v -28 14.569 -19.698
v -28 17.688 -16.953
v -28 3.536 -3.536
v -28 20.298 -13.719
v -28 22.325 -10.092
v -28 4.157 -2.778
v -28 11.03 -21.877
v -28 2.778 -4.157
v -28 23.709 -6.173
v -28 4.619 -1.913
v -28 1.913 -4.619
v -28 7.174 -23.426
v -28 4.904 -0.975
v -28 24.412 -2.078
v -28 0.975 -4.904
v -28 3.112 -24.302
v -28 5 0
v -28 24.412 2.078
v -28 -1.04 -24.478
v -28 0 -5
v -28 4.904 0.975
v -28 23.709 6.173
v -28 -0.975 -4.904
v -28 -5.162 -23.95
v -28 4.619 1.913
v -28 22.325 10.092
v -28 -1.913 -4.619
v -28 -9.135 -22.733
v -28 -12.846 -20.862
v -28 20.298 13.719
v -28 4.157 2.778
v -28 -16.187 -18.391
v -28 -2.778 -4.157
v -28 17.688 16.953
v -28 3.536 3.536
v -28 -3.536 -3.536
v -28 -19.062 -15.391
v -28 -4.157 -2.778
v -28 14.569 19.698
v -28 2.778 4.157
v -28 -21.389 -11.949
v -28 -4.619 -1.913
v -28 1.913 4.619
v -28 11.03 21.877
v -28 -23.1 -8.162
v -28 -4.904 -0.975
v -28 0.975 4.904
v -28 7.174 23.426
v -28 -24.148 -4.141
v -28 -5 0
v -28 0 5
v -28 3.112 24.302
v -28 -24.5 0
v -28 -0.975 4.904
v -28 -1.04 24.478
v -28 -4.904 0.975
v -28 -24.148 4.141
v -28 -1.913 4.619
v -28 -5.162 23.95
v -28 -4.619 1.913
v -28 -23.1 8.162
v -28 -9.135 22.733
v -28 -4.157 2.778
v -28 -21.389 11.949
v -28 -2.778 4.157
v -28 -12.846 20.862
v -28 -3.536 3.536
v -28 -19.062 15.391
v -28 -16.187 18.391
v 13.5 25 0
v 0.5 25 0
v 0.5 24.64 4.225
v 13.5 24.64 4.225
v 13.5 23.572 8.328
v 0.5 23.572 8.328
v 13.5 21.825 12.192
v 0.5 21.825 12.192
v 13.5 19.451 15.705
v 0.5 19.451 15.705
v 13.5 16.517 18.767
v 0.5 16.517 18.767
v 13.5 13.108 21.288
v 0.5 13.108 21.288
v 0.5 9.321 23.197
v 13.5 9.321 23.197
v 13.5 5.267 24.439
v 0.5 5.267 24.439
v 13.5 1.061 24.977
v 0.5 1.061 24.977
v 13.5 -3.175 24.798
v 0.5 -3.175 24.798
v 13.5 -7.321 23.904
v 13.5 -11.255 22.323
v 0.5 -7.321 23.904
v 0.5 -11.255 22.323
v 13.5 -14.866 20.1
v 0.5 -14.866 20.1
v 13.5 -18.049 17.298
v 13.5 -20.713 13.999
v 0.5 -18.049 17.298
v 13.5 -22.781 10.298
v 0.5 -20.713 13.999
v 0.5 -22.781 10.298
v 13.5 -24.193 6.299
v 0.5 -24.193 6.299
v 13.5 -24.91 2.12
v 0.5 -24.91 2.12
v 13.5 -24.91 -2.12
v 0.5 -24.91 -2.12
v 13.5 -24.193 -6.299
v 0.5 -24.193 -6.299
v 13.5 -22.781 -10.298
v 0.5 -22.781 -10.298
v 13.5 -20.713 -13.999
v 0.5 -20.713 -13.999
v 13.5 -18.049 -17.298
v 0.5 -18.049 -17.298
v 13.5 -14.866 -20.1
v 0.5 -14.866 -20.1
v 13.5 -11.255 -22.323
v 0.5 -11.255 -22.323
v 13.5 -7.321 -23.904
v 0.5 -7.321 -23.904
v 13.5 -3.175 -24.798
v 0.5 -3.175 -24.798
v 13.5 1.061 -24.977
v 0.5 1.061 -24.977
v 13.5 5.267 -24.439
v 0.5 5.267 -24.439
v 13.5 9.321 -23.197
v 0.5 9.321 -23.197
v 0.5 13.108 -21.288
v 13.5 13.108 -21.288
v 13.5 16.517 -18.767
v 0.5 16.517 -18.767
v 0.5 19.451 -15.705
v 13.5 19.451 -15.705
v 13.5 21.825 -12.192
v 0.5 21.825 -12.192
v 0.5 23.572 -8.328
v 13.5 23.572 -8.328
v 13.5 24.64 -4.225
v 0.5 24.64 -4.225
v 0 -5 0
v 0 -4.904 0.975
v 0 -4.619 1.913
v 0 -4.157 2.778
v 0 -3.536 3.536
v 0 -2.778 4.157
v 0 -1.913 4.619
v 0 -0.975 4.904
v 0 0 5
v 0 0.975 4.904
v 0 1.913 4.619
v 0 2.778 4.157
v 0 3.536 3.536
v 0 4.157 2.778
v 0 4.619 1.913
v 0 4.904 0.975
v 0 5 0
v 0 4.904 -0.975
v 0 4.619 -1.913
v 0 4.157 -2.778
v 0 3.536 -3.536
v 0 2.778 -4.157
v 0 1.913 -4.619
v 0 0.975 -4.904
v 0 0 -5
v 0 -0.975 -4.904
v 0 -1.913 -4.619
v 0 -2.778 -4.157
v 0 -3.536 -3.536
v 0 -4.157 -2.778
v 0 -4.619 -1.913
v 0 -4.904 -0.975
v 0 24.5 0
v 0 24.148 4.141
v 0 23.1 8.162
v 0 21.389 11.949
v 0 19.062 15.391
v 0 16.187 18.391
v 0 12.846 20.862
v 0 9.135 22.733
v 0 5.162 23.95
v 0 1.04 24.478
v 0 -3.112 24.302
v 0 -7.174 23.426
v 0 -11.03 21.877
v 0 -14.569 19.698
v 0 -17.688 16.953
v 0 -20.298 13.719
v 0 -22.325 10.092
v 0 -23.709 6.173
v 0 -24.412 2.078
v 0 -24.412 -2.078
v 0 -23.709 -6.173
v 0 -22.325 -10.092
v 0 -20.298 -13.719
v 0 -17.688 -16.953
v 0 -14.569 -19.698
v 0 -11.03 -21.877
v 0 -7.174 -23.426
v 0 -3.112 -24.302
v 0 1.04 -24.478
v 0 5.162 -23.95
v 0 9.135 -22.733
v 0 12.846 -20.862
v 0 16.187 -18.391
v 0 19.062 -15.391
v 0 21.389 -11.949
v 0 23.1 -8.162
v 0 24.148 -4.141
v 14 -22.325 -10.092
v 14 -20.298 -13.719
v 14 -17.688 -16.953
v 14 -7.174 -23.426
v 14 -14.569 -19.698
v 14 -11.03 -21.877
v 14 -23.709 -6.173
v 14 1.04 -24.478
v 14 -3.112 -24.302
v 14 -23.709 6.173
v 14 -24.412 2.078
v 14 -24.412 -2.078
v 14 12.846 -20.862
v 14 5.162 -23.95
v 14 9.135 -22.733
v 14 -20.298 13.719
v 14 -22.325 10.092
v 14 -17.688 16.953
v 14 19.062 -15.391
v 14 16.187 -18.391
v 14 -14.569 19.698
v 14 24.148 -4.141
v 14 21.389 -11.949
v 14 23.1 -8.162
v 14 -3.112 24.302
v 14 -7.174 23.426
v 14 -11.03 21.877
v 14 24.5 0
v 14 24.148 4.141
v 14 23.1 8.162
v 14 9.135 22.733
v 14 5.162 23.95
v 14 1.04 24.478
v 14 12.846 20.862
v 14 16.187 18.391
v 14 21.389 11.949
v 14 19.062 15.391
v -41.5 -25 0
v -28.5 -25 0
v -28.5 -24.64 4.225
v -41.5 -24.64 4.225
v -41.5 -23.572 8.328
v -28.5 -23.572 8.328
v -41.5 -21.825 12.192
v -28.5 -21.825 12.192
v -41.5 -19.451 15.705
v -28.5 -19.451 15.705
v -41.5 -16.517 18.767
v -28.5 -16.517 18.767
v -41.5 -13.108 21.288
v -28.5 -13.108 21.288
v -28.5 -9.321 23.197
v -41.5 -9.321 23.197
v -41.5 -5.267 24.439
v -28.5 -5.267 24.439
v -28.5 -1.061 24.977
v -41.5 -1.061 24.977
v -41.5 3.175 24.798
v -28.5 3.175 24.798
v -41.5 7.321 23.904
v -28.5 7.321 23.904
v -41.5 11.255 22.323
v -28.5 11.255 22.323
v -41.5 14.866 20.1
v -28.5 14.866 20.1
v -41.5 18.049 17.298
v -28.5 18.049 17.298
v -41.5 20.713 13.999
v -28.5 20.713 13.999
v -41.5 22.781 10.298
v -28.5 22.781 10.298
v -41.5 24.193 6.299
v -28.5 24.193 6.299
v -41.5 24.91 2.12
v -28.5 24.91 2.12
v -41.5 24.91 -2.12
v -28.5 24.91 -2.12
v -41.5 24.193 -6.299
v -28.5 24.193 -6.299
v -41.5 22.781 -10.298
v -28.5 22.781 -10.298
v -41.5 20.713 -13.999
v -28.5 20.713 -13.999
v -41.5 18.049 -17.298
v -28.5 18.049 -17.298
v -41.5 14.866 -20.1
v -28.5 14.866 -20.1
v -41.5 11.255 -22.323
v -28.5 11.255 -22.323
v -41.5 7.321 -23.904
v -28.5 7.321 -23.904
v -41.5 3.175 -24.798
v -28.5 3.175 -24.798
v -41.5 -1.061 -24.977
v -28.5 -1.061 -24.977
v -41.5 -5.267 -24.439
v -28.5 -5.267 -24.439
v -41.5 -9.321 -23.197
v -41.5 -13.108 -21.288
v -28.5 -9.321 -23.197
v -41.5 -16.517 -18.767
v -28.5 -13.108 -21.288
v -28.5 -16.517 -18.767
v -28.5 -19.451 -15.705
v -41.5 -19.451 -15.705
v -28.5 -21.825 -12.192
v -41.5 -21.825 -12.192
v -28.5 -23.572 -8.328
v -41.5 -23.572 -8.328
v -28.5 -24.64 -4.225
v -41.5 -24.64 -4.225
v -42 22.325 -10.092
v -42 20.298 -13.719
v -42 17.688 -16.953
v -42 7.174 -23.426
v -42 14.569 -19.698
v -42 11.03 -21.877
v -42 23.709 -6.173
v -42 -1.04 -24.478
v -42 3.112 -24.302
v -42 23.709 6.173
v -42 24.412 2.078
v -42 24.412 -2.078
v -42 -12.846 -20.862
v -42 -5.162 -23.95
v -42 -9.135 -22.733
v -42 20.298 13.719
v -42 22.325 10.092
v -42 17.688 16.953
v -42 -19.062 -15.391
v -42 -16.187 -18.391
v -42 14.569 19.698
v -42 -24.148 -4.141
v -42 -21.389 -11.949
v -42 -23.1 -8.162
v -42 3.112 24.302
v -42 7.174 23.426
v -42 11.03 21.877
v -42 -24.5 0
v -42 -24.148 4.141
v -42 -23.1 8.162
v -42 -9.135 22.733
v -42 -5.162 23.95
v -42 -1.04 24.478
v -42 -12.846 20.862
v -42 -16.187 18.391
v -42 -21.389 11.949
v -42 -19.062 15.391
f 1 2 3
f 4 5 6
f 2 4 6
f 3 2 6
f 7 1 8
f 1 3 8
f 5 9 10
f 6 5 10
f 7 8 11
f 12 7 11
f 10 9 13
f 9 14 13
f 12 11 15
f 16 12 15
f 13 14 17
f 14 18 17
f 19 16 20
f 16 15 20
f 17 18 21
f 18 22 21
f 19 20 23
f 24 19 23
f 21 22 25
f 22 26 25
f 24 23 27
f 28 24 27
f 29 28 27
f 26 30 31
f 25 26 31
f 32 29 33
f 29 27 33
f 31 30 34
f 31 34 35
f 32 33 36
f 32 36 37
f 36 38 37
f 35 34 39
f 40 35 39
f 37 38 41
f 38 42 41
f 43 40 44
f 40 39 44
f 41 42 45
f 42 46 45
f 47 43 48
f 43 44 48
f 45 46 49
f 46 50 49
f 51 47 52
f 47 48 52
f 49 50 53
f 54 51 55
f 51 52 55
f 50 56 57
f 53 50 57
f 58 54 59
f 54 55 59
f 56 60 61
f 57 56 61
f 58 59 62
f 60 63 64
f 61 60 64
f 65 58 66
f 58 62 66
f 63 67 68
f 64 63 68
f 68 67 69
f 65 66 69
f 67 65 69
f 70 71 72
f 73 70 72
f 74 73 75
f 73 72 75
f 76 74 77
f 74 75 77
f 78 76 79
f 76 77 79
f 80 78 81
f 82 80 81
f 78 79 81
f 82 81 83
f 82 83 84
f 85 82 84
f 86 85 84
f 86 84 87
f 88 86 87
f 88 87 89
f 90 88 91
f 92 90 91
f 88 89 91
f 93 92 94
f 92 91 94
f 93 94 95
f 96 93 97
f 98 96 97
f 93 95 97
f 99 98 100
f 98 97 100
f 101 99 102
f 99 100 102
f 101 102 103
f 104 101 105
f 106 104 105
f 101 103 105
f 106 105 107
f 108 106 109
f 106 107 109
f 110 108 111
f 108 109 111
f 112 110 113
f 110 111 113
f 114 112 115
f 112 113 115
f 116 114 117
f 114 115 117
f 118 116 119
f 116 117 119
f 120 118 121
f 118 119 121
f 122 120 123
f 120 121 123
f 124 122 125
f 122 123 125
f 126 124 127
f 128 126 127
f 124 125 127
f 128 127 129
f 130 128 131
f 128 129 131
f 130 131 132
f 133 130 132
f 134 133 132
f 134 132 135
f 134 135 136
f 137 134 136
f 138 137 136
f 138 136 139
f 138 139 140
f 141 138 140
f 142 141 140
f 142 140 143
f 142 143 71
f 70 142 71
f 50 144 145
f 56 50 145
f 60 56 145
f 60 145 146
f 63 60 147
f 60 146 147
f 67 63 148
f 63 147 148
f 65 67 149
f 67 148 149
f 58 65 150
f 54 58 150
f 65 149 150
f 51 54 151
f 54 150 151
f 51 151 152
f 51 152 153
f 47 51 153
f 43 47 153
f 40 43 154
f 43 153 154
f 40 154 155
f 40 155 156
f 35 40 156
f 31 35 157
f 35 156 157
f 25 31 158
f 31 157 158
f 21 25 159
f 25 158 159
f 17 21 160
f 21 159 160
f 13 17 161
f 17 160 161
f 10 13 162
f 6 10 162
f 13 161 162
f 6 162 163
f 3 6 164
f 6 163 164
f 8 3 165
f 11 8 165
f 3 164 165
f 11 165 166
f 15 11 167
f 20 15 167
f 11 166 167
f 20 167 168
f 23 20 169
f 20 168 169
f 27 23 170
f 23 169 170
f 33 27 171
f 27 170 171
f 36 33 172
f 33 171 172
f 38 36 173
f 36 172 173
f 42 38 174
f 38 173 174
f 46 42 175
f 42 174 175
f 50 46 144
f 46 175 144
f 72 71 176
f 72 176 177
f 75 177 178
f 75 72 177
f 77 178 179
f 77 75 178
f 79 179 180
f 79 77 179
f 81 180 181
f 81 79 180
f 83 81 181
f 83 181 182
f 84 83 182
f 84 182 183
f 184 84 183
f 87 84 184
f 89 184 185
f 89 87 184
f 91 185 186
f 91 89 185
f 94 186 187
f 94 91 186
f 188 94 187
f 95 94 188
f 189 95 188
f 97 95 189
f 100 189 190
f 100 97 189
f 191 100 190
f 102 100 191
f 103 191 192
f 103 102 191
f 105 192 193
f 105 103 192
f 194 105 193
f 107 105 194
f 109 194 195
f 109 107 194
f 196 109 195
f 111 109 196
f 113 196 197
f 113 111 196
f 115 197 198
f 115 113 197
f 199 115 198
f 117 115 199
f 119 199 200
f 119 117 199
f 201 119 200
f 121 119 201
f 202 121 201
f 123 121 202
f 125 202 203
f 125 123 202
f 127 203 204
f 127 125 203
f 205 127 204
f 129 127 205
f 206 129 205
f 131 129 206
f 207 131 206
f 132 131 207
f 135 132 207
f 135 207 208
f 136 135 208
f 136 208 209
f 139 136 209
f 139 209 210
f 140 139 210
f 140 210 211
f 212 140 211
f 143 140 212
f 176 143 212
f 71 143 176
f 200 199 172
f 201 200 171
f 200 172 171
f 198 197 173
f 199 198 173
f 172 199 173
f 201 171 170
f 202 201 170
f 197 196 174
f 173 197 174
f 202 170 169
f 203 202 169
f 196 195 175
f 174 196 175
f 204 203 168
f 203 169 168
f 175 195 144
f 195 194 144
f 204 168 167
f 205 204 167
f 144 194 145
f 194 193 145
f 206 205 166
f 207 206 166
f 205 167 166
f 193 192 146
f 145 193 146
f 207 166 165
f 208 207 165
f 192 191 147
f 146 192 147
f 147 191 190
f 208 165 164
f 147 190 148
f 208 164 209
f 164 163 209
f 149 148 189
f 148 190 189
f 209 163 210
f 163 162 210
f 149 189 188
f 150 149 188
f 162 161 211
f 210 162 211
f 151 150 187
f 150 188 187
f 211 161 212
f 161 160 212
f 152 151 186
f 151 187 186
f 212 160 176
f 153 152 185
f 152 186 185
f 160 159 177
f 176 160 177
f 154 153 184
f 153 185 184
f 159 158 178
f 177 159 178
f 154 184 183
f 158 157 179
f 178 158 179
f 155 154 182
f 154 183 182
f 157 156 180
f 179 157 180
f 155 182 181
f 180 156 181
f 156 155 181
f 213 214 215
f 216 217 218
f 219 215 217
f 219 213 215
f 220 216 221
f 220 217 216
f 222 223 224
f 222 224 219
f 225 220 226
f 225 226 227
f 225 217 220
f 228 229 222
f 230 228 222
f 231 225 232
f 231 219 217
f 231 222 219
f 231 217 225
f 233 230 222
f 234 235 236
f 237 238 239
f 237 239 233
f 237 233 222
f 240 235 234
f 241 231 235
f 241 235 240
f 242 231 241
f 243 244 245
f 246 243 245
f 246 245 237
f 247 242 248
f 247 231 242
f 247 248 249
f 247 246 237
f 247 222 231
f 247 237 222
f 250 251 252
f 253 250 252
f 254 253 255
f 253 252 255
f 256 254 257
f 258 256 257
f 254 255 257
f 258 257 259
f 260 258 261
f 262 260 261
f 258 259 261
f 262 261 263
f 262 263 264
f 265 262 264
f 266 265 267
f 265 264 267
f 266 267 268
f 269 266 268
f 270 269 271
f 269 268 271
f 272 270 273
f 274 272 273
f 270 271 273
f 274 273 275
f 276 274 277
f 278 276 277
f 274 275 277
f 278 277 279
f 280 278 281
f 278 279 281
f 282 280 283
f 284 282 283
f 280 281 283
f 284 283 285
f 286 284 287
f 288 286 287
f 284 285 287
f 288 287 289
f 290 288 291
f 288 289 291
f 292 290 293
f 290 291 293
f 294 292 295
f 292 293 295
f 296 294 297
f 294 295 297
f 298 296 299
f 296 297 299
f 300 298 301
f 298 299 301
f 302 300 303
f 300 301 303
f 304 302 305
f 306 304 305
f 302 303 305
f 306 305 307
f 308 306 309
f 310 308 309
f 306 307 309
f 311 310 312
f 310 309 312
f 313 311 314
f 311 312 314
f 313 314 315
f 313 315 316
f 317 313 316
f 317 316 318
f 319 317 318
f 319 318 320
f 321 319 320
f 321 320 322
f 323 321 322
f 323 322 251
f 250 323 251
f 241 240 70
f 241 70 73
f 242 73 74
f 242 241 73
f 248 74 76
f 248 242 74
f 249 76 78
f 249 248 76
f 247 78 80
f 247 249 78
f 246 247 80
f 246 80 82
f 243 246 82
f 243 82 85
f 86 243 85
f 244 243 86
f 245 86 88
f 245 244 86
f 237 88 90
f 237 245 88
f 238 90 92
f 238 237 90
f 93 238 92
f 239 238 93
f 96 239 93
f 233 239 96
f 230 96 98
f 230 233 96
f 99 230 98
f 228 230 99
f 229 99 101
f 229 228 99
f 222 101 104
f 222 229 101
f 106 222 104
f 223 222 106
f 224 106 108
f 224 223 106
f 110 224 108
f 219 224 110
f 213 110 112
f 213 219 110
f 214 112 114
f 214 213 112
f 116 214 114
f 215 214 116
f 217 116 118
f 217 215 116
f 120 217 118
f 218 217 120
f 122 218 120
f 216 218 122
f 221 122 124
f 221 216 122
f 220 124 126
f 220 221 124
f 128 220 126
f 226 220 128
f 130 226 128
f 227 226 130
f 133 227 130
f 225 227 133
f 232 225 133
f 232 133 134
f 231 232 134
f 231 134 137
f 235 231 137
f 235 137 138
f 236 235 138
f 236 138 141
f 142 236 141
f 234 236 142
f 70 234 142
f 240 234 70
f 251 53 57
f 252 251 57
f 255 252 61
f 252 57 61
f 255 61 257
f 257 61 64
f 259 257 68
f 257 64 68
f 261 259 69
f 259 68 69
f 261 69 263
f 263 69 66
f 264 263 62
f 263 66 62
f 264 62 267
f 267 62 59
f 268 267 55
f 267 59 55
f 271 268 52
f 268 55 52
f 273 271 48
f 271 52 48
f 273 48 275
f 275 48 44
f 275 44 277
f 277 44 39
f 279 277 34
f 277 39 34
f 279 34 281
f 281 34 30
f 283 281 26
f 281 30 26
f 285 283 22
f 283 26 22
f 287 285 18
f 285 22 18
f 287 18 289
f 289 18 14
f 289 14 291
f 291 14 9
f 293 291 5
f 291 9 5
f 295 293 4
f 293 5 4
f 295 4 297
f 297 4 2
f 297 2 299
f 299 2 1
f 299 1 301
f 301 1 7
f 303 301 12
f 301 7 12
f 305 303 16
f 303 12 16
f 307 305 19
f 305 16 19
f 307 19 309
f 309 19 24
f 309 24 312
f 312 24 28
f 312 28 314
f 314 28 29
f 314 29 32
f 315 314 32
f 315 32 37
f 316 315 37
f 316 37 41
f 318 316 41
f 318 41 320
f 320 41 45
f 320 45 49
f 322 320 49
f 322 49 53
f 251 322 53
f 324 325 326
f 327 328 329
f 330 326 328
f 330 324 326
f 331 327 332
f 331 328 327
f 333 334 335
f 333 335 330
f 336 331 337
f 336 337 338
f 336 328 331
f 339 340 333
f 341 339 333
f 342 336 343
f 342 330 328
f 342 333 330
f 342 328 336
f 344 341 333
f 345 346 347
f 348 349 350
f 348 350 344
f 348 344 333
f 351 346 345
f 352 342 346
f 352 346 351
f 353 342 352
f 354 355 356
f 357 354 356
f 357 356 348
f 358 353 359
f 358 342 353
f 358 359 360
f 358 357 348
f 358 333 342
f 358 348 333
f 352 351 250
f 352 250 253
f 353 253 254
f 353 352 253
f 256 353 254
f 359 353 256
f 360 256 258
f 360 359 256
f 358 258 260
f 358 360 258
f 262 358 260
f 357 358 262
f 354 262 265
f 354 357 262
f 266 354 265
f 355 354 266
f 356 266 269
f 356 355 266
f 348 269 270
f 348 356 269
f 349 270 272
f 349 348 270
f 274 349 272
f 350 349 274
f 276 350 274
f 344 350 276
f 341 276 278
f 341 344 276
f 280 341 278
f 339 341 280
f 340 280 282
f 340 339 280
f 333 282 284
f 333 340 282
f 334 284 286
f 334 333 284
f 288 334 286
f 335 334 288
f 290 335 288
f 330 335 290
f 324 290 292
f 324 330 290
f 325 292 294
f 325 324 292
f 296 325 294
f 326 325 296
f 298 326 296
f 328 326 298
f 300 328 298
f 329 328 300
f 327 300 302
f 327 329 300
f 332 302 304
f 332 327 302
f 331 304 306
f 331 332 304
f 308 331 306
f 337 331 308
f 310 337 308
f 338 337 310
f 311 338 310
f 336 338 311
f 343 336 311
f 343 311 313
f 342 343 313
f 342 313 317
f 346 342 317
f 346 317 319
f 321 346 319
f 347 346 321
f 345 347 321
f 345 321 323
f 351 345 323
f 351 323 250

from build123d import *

# Parameters (mm, degrees)
F0_R     = 25
F1_DEPTH = 14
F2_R     = 5
F3_DEPTH = 28
F4_R     = 25
F5_DEPTH = 14
F6_SIZE  = 0.5


with BuildPart() as f1:
    # F0 (on Right) → F1 (new body)
    with BuildSketch(Plane.YZ):
        Circle(F0_R)
    extrude(amount=F1_DEPTH)

    # F2 (on face) → F3 (join)
    with BuildSketch(Plane(origin=(0, 0, 0), x_dir=(0, -1, 0), z_dir=(-1, 0, 0))):
        Circle(F2_R)
    extrude(amount=F3_DEPTH)

    # F4 (on face) → F5 (join)
    with BuildSketch(Plane(origin=(-28, 0, 0), x_dir=(0, -1, 0), z_dir=(-1, 0, 0))):
        Circle(F4_R)
    extrude(amount=F5_DEPTH)

    # F6
    f6_edges = [f1.edges().sort_by_distance(p)[0] for p in [
        (14, -25, 0),
        (0, -25, 0),
        (-35, -25, 0),
        (-28, 25, 0),
        (-42, 25, 0),
    ]]
    chamfer(f6_edges, length=F6_SIZE)


solid = f1.part
